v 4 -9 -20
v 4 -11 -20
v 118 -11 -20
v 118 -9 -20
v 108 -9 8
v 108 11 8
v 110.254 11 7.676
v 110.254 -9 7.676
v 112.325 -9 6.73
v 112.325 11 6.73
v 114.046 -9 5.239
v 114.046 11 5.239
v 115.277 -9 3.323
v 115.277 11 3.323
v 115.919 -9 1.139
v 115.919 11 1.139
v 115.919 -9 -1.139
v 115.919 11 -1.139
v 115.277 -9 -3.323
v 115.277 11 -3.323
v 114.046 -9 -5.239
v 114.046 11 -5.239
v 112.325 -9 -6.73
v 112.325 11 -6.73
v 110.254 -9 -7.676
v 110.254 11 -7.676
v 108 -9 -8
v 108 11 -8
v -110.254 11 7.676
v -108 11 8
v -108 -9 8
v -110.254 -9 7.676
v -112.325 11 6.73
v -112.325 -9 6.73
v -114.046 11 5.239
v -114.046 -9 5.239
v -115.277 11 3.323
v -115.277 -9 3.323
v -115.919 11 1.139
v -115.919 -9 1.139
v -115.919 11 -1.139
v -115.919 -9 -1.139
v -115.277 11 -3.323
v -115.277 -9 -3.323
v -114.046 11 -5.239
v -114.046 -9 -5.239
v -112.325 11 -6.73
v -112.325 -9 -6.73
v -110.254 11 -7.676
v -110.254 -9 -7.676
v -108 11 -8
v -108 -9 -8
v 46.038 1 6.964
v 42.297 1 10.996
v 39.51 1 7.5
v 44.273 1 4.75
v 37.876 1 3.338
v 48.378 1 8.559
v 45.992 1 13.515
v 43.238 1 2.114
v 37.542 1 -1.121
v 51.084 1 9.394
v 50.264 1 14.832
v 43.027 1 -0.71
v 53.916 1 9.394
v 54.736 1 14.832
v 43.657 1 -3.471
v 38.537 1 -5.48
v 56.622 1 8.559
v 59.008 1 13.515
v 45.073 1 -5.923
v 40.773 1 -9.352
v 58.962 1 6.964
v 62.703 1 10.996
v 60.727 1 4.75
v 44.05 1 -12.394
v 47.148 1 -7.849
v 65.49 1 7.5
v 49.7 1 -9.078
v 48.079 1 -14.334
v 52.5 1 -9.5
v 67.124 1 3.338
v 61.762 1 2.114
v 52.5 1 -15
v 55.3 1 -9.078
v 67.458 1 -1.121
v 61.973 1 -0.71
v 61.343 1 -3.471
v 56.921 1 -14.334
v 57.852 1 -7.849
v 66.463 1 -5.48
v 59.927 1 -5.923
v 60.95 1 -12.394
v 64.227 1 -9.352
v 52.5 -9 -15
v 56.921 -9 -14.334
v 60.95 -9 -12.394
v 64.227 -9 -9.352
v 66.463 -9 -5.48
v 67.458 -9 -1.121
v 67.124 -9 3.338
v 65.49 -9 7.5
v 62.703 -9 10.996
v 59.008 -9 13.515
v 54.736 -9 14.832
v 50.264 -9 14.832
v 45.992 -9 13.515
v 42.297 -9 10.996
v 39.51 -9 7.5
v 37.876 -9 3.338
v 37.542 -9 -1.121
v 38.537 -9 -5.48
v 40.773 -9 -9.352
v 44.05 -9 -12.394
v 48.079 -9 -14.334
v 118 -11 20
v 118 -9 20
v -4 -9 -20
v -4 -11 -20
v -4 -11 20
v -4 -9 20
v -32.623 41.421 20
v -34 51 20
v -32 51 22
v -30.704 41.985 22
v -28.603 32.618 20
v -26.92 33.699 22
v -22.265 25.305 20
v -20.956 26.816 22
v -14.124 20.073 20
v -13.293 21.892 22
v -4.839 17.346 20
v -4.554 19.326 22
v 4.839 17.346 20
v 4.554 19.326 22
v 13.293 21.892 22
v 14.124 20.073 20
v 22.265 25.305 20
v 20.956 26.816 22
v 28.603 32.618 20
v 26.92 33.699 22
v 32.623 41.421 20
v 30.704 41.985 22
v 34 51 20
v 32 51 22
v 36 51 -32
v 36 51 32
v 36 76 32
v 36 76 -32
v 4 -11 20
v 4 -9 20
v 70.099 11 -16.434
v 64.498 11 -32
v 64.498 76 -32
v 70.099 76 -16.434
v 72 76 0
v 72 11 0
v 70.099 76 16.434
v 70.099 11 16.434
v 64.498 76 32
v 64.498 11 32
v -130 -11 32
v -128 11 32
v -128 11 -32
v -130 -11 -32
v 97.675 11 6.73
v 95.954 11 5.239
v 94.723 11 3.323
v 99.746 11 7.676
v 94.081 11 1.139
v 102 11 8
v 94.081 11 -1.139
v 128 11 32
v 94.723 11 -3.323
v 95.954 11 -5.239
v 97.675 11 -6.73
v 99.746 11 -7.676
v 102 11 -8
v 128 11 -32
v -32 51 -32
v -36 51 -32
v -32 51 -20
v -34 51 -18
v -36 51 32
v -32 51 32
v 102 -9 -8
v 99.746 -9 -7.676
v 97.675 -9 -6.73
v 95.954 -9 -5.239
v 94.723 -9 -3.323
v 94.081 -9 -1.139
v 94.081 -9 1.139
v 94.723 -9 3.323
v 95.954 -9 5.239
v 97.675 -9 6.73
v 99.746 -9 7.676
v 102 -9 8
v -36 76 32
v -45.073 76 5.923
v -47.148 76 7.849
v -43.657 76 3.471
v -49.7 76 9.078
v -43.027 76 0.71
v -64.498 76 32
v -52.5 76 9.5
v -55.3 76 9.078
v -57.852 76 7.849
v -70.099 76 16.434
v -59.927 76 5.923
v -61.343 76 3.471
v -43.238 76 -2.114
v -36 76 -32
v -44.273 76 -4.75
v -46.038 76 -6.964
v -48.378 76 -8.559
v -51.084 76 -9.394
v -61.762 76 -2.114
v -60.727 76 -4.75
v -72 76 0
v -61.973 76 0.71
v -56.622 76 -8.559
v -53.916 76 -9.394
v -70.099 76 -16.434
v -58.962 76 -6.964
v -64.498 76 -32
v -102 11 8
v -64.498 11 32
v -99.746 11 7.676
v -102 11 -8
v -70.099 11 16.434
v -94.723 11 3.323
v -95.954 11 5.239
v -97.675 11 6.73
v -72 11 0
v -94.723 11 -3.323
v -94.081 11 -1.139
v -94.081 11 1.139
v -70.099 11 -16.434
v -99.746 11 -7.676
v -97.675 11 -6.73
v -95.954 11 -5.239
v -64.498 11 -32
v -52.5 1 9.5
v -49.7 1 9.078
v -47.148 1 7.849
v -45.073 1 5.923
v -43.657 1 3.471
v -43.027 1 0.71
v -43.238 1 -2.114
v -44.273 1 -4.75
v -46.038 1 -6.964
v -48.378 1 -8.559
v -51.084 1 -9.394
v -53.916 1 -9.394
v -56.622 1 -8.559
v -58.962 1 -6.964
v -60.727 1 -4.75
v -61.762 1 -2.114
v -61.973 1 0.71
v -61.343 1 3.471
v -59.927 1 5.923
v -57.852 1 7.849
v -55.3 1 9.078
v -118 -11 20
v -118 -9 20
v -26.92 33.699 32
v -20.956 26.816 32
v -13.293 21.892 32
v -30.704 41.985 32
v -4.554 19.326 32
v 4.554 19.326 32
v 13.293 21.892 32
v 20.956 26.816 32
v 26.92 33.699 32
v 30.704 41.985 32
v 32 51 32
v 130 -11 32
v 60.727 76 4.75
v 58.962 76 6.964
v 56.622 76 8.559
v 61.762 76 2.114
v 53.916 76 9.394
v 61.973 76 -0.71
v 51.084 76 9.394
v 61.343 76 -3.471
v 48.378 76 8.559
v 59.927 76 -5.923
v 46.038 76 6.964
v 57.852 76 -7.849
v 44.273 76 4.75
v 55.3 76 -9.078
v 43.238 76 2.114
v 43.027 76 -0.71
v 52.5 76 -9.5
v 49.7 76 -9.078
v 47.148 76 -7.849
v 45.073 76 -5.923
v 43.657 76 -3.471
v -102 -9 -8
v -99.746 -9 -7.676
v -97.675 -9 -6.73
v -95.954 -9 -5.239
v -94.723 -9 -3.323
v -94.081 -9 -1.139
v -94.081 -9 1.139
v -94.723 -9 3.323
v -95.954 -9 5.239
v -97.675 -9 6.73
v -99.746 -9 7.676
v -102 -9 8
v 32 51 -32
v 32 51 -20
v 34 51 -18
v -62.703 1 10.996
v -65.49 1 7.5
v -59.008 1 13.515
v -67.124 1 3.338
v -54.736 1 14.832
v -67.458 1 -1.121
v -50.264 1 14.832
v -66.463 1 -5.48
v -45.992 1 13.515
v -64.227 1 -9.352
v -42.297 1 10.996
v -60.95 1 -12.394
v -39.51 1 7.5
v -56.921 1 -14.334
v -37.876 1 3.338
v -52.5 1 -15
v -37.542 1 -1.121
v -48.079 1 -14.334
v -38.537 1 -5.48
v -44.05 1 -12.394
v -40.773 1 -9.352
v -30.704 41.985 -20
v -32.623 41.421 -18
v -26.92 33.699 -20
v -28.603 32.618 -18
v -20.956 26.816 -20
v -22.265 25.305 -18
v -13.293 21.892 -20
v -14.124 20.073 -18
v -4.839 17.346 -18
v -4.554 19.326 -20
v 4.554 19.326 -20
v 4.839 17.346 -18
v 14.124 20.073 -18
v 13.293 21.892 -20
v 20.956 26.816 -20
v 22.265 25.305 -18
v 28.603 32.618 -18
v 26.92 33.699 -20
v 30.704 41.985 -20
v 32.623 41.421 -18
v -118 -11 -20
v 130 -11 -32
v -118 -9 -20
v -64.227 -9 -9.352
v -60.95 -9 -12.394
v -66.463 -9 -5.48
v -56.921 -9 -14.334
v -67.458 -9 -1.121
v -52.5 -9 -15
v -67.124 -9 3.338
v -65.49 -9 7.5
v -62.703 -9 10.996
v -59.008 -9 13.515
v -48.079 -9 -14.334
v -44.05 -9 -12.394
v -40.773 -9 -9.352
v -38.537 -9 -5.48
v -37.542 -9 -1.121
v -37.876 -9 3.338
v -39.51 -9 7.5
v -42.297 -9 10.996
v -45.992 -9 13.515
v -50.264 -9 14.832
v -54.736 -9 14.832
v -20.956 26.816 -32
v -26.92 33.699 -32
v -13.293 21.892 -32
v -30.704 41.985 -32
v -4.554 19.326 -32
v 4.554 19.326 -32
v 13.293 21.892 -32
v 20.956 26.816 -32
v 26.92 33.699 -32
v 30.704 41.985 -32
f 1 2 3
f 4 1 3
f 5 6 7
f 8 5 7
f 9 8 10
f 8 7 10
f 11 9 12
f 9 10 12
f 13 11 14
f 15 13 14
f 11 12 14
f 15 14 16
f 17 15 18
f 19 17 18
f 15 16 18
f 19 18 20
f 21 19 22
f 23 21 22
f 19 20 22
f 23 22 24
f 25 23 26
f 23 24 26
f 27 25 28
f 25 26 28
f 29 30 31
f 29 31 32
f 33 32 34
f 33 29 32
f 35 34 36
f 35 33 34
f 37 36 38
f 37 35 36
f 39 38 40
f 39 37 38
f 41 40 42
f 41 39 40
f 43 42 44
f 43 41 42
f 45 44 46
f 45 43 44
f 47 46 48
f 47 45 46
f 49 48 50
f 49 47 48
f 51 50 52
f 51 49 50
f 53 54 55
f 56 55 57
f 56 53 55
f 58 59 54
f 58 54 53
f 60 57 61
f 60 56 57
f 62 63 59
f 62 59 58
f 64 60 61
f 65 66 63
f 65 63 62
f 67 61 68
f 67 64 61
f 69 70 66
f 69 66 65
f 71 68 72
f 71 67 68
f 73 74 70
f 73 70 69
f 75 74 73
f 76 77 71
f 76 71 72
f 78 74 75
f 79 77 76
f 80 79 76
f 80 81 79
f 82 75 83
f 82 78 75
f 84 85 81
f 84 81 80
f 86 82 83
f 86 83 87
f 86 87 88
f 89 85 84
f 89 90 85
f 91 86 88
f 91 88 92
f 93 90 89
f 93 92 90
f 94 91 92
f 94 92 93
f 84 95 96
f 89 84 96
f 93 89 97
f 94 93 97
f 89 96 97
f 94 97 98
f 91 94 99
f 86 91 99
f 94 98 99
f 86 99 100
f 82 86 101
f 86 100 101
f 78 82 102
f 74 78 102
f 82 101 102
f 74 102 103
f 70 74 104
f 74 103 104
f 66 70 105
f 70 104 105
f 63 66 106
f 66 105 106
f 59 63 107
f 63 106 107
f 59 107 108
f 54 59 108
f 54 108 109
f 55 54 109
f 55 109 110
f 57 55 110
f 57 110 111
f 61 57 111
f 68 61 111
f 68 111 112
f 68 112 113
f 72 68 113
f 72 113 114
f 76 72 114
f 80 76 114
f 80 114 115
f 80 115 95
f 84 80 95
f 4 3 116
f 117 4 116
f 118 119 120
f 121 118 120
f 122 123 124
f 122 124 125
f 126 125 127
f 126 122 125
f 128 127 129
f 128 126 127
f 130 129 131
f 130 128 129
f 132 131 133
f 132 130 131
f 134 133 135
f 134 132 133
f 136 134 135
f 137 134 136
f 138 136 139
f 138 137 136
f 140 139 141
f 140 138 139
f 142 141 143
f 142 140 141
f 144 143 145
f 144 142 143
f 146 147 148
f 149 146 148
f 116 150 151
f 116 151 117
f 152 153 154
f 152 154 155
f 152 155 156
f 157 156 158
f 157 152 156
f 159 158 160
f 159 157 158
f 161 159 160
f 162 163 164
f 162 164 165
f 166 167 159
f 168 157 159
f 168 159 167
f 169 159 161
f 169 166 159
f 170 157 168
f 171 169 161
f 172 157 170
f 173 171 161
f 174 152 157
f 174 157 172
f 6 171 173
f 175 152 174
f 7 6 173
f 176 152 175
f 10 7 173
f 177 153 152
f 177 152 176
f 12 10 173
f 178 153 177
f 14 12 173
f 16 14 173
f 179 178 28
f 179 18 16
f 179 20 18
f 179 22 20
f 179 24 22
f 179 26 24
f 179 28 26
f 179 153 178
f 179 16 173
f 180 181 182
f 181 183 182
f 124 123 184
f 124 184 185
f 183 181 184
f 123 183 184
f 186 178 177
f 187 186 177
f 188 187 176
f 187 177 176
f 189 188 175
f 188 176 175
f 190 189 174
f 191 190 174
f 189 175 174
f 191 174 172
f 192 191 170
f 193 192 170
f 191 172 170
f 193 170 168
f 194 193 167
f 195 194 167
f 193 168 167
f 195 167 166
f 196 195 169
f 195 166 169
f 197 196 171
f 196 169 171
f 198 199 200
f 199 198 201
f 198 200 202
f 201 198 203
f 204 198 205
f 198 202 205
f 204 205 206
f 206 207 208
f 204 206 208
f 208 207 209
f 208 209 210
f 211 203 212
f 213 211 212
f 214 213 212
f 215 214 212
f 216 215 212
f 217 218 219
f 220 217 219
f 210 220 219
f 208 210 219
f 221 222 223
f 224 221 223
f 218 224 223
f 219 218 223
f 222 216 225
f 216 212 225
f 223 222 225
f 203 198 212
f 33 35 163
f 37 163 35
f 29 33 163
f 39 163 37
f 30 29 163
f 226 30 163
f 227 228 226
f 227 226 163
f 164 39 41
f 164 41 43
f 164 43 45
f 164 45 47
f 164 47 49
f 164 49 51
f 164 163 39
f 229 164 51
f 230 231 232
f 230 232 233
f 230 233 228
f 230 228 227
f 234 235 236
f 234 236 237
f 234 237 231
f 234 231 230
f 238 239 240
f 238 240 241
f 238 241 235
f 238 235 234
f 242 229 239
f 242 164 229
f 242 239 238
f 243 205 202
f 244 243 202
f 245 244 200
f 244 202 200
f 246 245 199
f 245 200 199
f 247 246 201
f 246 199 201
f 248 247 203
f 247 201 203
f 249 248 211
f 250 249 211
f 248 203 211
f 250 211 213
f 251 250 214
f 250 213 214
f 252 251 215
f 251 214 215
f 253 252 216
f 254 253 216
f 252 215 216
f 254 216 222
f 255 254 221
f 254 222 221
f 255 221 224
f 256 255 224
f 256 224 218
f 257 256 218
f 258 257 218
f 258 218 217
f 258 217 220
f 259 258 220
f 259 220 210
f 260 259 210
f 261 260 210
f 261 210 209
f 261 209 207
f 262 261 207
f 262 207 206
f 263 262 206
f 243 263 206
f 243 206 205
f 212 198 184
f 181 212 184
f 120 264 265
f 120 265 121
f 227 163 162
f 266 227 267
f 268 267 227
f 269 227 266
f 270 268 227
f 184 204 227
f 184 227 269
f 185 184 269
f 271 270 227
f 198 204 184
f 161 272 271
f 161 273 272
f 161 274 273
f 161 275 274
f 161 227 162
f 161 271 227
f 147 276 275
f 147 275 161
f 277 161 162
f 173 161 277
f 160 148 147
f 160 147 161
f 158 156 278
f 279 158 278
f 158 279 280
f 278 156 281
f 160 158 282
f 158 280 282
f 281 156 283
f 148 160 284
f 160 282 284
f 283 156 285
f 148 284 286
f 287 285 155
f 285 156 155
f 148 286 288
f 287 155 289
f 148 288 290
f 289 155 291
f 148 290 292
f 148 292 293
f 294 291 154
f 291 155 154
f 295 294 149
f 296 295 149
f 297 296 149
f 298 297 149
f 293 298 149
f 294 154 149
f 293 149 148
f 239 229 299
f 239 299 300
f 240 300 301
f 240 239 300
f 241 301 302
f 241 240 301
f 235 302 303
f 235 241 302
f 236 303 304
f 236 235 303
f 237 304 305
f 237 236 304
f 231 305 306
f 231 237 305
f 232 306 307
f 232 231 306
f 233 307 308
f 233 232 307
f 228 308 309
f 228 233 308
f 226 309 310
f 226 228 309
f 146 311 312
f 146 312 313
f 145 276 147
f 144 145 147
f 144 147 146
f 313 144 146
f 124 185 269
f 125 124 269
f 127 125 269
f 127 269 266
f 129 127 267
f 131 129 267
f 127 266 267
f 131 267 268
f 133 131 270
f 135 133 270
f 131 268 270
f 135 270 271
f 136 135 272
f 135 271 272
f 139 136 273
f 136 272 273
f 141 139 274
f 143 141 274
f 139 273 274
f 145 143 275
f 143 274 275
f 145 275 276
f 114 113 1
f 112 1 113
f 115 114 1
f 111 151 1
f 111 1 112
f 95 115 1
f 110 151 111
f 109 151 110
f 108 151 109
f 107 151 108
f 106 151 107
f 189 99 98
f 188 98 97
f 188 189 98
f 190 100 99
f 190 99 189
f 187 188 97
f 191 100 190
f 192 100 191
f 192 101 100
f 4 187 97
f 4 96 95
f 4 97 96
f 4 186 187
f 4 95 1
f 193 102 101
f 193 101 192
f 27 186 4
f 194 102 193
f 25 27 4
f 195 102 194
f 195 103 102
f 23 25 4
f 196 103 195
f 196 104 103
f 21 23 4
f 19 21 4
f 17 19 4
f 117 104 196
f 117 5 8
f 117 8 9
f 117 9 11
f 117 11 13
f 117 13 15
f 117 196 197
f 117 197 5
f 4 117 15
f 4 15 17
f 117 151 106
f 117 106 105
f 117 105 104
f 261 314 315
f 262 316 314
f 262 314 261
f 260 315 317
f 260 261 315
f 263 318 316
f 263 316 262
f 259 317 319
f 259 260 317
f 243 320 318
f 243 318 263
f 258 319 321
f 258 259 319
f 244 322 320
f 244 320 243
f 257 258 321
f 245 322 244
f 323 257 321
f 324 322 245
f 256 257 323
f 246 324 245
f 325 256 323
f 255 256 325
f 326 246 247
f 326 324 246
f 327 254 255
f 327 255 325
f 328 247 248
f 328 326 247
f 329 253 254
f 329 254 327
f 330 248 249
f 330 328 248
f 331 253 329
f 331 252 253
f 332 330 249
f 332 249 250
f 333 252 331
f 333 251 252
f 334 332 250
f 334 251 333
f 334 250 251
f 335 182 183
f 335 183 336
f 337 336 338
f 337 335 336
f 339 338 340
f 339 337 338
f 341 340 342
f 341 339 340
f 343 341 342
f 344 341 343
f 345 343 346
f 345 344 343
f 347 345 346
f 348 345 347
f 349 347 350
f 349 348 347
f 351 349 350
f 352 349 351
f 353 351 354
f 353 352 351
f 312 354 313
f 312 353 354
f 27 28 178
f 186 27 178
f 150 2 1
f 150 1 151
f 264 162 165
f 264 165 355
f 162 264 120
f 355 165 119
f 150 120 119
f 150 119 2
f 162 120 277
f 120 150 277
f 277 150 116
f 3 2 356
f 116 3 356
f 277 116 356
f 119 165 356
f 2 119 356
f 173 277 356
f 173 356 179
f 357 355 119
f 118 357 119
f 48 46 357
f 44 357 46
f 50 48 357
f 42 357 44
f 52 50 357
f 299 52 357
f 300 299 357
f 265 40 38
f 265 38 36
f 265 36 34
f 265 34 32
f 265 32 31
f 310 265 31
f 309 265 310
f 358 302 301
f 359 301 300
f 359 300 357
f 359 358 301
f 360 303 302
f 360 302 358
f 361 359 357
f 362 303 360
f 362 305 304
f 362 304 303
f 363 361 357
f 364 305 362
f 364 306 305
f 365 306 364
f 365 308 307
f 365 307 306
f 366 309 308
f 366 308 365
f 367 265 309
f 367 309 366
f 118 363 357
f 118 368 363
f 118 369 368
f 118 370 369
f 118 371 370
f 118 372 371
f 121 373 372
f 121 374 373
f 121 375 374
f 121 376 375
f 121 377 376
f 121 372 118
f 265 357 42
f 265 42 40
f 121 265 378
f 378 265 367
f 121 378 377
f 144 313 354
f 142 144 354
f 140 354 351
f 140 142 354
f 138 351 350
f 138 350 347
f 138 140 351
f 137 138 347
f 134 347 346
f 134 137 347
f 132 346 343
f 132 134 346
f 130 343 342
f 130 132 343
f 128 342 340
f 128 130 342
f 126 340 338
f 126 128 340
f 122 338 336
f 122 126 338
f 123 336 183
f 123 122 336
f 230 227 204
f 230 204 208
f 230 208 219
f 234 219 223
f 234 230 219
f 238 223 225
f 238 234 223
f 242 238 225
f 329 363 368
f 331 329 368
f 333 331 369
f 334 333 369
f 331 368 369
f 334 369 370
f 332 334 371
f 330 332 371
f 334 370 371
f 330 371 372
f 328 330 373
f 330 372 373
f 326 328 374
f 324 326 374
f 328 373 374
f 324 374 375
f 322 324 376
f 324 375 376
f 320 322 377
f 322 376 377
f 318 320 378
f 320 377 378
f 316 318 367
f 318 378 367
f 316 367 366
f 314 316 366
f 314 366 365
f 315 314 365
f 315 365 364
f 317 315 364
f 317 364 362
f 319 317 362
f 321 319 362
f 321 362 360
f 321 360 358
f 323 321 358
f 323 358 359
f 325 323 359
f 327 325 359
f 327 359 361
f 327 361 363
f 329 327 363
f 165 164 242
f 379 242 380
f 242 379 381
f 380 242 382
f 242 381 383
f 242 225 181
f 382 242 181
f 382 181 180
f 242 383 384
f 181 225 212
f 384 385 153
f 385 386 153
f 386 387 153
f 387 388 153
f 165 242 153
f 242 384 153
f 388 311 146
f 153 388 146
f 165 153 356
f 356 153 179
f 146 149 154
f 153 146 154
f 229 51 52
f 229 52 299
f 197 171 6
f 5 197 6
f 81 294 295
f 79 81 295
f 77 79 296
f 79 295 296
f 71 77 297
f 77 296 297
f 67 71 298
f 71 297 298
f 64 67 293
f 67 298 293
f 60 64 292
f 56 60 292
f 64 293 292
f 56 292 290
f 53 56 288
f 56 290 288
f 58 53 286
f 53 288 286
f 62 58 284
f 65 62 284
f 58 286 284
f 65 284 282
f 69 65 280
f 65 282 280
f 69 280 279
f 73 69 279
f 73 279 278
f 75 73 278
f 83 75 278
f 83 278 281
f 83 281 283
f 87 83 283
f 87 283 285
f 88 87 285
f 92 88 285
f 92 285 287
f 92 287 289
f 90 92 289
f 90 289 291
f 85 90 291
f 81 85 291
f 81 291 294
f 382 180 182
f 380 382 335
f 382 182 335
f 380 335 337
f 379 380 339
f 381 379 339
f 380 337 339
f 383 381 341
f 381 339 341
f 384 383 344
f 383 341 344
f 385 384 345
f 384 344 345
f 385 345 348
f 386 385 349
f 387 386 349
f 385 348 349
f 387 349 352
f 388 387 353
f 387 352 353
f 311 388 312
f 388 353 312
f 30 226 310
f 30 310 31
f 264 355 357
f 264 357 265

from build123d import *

# Parameters (mm, degrees)
SKETCH1_W           = 260
SKETCH1_H           = 64
BOSS_EXTRUDE1_DEPTH = 11
CUT_EXTRUDE1_DEPTH  = 22
BOSS_EXTRUDE2_DEPTH = 65
CUT_EXTRUDE2_DEPTH  = 164.621514478
CUT_EXTRUDE3_DEPTH  = 96
SKETCH6_R           = 9.5
CUT_EXTRUDE4_DEPTH  = 96
SKETCH7_R           = 15
CUT_EXTRUDE5_DEPTH  = 12
CUT_EXTRUDE7_START  = -12
CUT_EXTRUDE7_DEPTH  = 38
CHAMFER1_SIZE       = 2
CHAMFER2_SIZE       = 2
SKETCH13_W          = 114
SKETCH13_H          = 40
CUT_EXTRUDE8_DEPTH  = 2


with BuildPart() as part:
    # Sketch1 → Boss-Extrude1 (new, symmetric)
    with BuildSketch(Plane(origin=(0, 0, 0), x_dir=(1, 0, 0), z_dir=(0, 1, 0))):
        Rectangle(SKETCH1_W, SKETCH1_H)
    extrude(amount=BOSS_EXTRUDE1_DEPTH, both=True)

    # Sketch2 → Cut-Extrude1 (cut)
    with BuildSketch(Plane(origin=(0, 11, 0), x_dir=(1, 0, 0), z_dir=(0, 1, 0))):
        with BuildLine():
            Line((-108, 8), (-102, 8))
            ThreePointArc((-102, 8), (-94, 0), (-102, -8))
            Line((-102, -8), (-108, -8))
            ThreePointArc((-108, -8), (-116, 0), (-108, 8))
        make_face()
        with BuildLine():
            Line((108, 8), (102, 8))
            ThreePointArc((102, 8), (94, 0), (102, -8))
            Line((102, -8), (108, -8))
            ThreePointArc((108, -8), (116, 0), (108, 8))
        make_face()
    extrude(amount=-CUT_EXTRUDE1_DEPTH, mode=Mode.SUBTRACT)

    # Sketch3 → Boss-Extrude2 (add)
    with BuildSketch(Plane(origin=(0, 11, 0), x_dir=(1, 0, 0), z_dir=(0, 1, 0))):
        with BuildLine():
            Line((-64.498061986, 32), (64.498061986, 32))
            ThreePointArc((64.498061986, 32), (72, 0), (64.498061986, -32))
            Line((64.498061986, -32), (-64.498061986, -32))
            ThreePointArc((-64.498061986, -32), (-72, 0), (-64.498061986, 32))
        make_face()
    extrude(amount=BOSS_EXTRUDE2_DEPTH)

    # Sketch4 → Cut-Extrude2 (cut, through all)
    with BuildSketch(Plane.XY.offset(32)):
        Polygon((-130, 11), (-128, 11), (-130, -11), align=None)
        Polygon((130, -11), (128, 11), (130, 11), align=None)
    extrude(amount=-CUT_EXTRUDE2_DEPTH, mode=Mode.SUBTRACT)

    # Sketch5 → Cut-Extrude3 (cut)
    with BuildSketch(Plane.XY.offset(32)):
        with BuildLine():
            Line((-19.974984355, 76), (-36, 76))
            Line((-36, 76), (-36, 51))
            Line((-36, 51), (-32, 51))
            ThreePointArc((-32, 51), (0, 19), (32, 51))
            Line((32, 51), (36, 51))
            Line((36, 51), (36, 76))
            Line((36, 76), (-19.974984355, 76))
        make_face()
    extrude(amount=-CUT_EXTRUDE3_DEPTH, mode=Mode.SUBTRACT)

    # Sketch6 → Cut-Extrude4 (cut)
    with BuildSketch(Plane(origin=(0, 76, 0), x_dir=(1, 0, 0), z_dir=(0, 1, 0))):
        with Locations(Location((-52.5, 0, 0), (0, 0, 270))):
            Circle(SKETCH6_R)
        with Locations(Location((52.5, 0, 0), (0, 0, 90))):
            Circle(SKETCH6_R)
    extrude(amount=-CUT_EXTRUDE4_DEPTH, mode=Mode.SUBTRACT)

    # Sketch7 → Cut-Extrude5 (cut)
    with BuildSketch(Plane.XZ.offset(11)):
        with Locations(Location((-52.5, 0, 0), (0, 0, 270))):
            Circle(SKETCH7_R)
        with Locations(Location((52.5, 0, 0), (0, 0, 270))):
            Circle(SKETCH7_R)
    extrude(amount=-CUT_EXTRUDE5_DEPTH, mode=Mode.SUBTRACT)

    # Sketch10 → Cut-Extrude7 (cut)
    with BuildSketch(Plane.XY.offset(32).offset(CUT_EXTRUDE7_START)):
        with BuildLine():
            Line((-34, 51), (34, 51))
            ThreePointArc((34, 51), (0, 17), (-34, 51))
        make_face()
    extrude(amount=-CUT_EXTRUDE7_DEPTH, mode=Mode.SUBTRACT)

    # Chamfer1
    chamfer1_edges = [part.edges().sort_by_distance(p)[0] for p in [
        (0, 19, 20),
    ]]
    chamfer(chamfer1_edges, length=CHAMFER1_SIZE - 0.0001)  # a hair under: the kernel refuses the full size

    # Chamfer2
    chamfer2_edges = [part.edges().sort_by_distance(p)[0] for p in [
        (0, 19, -18),
    ]]
    chamfer(chamfer2_edges, length=CHAMFER2_SIZE - 0.0001)  # a hair under: the kernel refuses the full size

    # Sketch13 → Cut-Extrude8 (cut)
    with BuildSketch(Plane.XZ.offset(11)):
        with Locations((-61, -2.5e-06)):
            Rectangle(SKETCH13_W, SKETCH13_H)
        with Locations((61, -2.5e-06)):
            Rectangle(SKETCH13_W, SKETCH13_H)
    extrude(amount=-CUT_EXTRUDE8_DEPTH, mode=Mode.SUBTRACT)


solid = part.part
